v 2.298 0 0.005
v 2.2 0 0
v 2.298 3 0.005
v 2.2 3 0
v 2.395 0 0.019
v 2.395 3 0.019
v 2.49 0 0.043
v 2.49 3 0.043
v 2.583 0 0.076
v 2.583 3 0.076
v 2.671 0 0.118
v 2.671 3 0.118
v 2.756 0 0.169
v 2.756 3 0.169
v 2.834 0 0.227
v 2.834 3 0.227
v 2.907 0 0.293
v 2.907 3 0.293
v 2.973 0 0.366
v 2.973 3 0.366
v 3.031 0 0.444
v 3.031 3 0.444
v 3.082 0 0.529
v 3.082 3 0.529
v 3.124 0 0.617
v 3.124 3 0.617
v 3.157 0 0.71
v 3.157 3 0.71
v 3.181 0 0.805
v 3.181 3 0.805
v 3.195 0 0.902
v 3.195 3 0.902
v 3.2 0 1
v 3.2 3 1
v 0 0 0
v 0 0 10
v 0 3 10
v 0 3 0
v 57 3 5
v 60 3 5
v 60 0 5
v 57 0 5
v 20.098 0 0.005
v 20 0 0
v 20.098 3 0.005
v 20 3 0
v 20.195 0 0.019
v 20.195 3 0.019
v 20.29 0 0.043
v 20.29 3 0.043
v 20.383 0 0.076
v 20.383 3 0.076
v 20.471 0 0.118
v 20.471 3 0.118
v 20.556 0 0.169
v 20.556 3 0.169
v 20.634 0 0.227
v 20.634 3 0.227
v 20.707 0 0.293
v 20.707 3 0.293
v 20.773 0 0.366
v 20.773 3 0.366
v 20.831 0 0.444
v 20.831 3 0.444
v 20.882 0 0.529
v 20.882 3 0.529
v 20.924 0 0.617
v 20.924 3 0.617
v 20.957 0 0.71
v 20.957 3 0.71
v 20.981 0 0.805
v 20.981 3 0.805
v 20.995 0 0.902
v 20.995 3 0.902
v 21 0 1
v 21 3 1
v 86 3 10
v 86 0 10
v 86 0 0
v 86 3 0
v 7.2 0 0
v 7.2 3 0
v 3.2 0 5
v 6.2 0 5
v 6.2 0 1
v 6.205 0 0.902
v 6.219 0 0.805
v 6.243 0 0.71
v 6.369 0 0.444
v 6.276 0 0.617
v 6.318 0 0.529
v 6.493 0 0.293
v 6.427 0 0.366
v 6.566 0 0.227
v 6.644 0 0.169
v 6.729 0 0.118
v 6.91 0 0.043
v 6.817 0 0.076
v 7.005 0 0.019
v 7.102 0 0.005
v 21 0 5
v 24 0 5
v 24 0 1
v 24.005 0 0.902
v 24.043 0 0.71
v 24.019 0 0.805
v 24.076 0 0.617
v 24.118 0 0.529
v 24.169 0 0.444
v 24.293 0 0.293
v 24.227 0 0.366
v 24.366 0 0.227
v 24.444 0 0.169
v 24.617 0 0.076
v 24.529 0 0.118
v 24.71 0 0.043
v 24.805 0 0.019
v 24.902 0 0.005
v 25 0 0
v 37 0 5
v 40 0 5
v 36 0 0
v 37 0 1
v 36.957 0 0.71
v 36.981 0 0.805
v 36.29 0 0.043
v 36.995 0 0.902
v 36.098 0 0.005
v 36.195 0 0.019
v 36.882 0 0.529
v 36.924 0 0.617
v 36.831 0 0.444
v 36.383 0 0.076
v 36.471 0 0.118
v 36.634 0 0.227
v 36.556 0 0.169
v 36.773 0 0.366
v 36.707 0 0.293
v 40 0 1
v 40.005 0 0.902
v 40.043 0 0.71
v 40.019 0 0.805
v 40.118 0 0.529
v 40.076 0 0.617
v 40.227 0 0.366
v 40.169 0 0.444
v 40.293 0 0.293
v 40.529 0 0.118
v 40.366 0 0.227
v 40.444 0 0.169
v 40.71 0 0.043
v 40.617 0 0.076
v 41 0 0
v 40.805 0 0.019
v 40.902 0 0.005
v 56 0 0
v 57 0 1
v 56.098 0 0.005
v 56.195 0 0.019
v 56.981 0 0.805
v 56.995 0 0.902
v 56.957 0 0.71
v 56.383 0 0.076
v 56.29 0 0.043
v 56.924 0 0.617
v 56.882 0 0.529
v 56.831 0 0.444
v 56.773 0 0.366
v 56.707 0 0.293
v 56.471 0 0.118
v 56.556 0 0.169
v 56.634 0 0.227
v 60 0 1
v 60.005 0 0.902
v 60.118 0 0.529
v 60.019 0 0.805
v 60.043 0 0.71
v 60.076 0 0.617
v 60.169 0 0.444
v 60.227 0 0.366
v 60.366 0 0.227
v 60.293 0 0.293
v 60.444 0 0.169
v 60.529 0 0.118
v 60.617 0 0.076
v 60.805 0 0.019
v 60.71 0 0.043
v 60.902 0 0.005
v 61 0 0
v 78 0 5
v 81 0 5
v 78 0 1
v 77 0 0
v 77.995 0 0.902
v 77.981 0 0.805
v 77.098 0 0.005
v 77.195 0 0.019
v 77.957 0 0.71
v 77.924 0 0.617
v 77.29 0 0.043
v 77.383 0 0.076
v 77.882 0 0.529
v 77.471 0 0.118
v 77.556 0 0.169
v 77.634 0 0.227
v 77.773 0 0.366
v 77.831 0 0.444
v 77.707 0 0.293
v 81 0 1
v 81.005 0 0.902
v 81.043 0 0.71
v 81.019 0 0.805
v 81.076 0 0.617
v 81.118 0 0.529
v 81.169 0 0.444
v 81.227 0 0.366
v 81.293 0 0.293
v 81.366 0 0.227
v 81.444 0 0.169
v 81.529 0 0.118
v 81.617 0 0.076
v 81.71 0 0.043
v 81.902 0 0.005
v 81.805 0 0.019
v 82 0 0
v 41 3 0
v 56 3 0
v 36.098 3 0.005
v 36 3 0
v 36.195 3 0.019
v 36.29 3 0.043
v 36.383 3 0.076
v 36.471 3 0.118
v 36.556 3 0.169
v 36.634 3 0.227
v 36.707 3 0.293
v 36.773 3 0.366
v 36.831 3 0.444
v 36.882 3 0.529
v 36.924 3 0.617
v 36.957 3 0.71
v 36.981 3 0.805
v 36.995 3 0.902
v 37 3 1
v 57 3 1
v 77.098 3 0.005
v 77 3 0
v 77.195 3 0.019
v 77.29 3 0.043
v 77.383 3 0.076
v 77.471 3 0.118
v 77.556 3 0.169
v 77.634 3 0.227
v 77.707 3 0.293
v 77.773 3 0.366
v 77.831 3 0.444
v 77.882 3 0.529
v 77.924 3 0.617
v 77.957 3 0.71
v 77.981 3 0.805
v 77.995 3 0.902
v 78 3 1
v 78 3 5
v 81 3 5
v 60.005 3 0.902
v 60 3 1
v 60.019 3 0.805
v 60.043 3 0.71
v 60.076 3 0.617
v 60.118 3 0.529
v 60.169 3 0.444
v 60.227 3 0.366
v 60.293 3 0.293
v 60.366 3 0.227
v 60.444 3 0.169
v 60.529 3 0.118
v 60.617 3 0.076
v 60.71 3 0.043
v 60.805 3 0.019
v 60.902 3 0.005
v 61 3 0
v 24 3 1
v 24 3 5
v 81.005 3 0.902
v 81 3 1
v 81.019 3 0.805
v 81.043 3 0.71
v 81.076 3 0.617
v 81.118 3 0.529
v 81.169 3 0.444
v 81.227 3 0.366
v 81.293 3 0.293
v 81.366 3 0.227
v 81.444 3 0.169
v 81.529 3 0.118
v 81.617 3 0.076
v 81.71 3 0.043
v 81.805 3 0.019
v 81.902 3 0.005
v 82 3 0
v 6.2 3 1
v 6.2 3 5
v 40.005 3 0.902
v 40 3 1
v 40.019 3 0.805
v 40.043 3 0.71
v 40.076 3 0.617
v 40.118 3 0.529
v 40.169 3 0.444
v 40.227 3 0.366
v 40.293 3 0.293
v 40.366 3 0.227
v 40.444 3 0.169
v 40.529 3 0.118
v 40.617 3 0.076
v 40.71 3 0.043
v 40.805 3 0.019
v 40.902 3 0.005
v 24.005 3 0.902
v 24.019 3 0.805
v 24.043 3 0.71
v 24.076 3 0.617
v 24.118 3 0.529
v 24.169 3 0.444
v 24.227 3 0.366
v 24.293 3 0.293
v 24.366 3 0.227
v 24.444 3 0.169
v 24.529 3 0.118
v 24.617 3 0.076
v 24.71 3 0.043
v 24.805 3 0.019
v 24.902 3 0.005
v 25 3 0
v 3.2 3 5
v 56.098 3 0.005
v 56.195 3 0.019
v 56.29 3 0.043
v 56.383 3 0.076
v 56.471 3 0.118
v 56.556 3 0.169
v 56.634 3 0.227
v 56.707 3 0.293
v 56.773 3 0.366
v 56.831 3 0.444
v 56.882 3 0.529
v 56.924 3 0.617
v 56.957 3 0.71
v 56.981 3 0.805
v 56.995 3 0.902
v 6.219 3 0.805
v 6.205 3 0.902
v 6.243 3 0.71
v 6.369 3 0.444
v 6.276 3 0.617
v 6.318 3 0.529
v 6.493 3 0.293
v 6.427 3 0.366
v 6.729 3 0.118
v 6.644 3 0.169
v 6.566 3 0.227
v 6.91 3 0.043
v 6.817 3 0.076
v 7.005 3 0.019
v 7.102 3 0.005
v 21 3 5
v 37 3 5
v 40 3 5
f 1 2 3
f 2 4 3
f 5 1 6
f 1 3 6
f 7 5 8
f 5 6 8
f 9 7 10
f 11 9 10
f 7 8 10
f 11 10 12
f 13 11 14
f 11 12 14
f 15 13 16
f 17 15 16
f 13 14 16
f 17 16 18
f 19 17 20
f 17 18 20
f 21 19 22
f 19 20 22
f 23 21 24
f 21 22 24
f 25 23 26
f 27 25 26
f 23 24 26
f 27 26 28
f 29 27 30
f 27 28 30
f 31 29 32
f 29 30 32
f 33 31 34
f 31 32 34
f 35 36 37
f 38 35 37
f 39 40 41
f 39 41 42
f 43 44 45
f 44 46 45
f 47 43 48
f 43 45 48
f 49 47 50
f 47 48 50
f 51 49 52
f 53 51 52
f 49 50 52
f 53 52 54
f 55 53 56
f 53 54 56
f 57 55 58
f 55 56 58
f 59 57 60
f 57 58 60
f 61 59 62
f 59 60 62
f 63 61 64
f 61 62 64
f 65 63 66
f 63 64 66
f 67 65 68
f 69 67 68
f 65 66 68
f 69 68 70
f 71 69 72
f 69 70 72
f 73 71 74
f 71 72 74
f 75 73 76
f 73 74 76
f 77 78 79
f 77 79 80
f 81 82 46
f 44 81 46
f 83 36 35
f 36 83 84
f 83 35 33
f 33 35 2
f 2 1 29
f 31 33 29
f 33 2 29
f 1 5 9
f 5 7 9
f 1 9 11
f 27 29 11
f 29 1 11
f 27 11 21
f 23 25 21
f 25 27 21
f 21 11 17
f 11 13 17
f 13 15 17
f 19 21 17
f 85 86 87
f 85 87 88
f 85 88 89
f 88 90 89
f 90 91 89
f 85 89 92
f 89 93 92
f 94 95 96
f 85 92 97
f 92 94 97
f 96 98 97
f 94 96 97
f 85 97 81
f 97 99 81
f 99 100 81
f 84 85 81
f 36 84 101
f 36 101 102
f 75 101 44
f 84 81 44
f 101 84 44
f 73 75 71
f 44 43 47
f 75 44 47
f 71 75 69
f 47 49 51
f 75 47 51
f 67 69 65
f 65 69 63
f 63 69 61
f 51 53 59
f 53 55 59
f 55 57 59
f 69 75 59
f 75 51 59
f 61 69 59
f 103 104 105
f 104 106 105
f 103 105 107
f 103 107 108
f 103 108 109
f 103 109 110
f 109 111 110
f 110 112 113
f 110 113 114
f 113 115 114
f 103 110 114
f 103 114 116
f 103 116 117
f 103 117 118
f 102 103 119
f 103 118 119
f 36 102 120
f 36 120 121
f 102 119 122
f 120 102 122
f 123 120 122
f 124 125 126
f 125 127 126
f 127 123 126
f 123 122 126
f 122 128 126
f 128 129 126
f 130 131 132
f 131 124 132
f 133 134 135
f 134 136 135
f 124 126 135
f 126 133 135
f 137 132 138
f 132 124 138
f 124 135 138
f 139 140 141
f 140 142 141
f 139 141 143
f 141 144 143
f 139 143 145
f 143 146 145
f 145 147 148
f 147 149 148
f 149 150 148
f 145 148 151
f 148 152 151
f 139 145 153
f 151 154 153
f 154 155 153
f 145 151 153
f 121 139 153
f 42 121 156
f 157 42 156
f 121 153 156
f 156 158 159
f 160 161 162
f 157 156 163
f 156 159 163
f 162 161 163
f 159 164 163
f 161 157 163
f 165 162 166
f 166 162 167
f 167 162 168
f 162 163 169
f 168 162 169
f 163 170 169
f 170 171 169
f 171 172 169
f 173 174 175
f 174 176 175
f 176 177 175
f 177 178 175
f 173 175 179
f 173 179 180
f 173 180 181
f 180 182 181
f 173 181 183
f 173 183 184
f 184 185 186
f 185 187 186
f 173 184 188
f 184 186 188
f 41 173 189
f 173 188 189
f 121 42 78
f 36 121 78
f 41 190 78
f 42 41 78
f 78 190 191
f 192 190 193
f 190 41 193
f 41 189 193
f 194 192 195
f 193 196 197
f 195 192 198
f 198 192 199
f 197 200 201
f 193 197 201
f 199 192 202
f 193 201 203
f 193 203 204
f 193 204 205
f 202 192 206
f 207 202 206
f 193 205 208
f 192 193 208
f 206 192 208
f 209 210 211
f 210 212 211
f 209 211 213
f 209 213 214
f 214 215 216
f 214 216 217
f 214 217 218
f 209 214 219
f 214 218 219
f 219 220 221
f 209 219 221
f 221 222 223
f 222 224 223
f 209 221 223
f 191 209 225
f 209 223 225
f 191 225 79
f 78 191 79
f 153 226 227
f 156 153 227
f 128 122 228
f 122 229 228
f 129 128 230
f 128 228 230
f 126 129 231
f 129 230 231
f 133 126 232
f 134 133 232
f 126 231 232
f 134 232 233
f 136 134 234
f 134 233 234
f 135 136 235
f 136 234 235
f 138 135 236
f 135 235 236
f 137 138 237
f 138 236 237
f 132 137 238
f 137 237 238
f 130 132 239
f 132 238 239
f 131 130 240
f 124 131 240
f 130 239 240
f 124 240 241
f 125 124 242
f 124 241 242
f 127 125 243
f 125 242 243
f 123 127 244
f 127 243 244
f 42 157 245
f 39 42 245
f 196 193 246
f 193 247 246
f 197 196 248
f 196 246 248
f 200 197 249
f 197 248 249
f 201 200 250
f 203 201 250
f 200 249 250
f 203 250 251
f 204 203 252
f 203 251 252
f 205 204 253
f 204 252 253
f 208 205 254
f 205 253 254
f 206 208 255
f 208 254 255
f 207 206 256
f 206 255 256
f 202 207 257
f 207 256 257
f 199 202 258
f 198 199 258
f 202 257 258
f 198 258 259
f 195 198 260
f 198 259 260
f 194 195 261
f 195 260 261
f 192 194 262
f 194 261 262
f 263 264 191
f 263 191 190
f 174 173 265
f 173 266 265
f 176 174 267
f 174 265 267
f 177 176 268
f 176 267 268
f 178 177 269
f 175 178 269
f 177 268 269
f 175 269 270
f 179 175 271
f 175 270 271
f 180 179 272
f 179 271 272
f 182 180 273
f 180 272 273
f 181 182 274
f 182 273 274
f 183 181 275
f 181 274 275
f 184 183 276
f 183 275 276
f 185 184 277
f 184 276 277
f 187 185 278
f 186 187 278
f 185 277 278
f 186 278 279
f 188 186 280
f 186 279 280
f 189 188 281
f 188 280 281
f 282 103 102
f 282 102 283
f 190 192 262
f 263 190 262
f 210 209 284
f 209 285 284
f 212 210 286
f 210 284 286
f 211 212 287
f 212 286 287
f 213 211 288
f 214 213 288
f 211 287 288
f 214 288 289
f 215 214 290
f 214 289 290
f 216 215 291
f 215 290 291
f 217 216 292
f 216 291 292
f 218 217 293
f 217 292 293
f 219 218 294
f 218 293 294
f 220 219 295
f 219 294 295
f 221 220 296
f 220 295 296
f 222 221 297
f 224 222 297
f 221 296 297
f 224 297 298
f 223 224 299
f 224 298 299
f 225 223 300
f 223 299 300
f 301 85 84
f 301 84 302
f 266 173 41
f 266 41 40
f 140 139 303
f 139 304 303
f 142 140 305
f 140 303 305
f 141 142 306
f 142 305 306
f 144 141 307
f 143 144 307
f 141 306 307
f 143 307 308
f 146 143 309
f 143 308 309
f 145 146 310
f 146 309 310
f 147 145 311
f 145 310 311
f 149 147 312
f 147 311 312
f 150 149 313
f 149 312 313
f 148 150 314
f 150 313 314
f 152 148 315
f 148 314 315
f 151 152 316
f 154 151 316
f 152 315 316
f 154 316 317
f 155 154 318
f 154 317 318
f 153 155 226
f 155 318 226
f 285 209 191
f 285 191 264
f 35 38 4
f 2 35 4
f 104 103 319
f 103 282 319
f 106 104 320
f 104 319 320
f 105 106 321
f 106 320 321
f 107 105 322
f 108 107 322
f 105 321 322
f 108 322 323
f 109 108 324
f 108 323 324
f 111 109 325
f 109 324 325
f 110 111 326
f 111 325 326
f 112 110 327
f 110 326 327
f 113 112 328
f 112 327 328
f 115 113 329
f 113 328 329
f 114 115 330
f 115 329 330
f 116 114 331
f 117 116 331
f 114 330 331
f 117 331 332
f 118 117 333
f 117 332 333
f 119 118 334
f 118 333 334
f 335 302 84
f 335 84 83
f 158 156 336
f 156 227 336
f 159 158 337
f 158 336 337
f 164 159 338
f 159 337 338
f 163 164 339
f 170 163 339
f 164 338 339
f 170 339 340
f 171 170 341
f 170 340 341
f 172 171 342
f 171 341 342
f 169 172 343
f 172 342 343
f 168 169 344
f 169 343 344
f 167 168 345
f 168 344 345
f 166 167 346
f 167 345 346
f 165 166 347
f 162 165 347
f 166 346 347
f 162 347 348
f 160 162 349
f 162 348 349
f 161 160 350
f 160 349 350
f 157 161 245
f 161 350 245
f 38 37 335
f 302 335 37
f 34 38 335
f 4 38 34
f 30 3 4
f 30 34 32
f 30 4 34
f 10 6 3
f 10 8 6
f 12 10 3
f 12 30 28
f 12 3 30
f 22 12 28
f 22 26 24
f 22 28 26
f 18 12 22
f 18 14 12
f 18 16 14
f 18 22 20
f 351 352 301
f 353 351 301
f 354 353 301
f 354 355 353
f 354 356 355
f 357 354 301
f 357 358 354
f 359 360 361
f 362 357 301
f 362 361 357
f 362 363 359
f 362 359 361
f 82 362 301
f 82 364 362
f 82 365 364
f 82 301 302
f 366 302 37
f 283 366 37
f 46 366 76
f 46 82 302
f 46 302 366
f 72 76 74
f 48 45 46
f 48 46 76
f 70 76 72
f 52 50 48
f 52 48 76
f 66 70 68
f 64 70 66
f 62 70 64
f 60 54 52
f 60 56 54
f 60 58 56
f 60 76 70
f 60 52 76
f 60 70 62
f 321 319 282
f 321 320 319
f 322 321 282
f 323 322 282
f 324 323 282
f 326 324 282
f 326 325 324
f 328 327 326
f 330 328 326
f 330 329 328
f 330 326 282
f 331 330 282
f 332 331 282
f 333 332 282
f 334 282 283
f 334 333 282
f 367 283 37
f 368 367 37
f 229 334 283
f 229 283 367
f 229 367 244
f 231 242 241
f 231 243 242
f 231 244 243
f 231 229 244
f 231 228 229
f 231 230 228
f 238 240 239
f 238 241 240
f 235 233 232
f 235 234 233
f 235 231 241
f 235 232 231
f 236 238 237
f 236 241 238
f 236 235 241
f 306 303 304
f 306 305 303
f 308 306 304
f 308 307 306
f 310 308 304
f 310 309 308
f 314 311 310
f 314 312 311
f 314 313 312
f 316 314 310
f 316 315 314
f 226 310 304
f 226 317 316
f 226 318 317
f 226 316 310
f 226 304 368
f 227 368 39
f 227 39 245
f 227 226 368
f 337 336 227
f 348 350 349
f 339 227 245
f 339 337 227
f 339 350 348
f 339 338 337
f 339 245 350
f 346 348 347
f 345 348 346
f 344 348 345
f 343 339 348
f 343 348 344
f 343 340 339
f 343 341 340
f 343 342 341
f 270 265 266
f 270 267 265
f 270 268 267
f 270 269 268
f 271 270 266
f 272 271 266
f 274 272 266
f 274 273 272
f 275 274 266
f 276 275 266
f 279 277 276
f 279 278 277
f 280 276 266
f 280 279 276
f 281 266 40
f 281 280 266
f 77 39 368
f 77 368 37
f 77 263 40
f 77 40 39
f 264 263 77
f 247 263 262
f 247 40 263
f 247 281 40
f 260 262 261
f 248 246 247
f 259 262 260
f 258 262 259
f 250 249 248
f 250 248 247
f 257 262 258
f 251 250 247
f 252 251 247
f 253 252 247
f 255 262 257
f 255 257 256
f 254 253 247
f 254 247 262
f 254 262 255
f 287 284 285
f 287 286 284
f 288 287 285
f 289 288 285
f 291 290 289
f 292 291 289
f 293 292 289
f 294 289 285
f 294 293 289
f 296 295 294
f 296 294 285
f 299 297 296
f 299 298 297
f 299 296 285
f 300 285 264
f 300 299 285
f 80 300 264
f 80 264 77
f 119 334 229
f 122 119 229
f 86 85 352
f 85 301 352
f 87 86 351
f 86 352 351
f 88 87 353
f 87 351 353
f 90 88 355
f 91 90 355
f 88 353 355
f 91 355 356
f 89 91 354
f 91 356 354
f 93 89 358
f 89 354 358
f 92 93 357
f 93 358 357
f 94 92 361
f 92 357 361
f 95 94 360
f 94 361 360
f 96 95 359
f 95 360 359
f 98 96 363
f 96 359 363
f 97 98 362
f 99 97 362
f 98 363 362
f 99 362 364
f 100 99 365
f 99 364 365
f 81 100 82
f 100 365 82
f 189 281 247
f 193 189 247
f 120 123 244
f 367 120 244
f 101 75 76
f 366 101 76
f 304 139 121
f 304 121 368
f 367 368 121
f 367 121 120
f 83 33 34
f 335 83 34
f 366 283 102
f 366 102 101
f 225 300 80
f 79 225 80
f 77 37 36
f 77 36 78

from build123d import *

# Parameters (mm, degrees)
SKETCH1_W           = 86
SKETCH1_H           = 3
BOSS_EXTRUDE1_DEPTH = 10
SKETCH3_W           = 3
SKETCH3_H           = 3
CUT_EXTRUDE2_DEPTH  = 5
FILLET2_R           = 1


with BuildPart() as part:
    # Sketch1 → Boss-Extrude1 (new body)
    with BuildSketch(Plane.XY):
        with Locations((43, 1.5)):
            Rectangle(SKETCH1_W, SKETCH1_H)
    extrude(amount=BOSS_EXTRUDE1_DEPTH)

    # Sketch3 → Cut-Extrude2 (cut)
    with BuildSketch(Plane(origin=(0, 0, 0), x_dir=(-1, 0, 0), z_dir=(0, 0, -1))):
        with Locations((-79.5, 1.5)):
            Rectangle(SKETCH3_W, SKETCH3_H)
        with Locations((-58.5, 1.5)):
            Rectangle(SKETCH3_W, SKETCH3_H)
        with Locations((-38.5, 1.5)):
            Rectangle(SKETCH3_W, SKETCH3_H)
        with Locations((-22.5, 1.5)):
            Rectangle(SKETCH3_W, SKETCH3_H)
        with Locations((-4.7, 1.5)):
            Rectangle(SKETCH3_W, SKETCH3_H)
    extrude(amount=-CUT_EXTRUDE2_DEPTH, mode=Mode.SUBTRACT)

    # Fillet2
    fillet2_edges = [part.edges().sort_by_distance(p)[0] for p in [
        (78, 1.5, 0),
        (81, 1.5, 0),
        (57, 1.5, 0),
        (60, 1.5, 0),
        (37, 1.5, 0),
        (40, 1.5, 0),
        (21, 1.5, 0),
        (24, 1.5, 0),
        (3.2, 1.5, 0),
        (6.2, 1.5, 0),
    ]]
    fillet(fillet2_edges, radius=FILLET2_R)


solid = part.part
